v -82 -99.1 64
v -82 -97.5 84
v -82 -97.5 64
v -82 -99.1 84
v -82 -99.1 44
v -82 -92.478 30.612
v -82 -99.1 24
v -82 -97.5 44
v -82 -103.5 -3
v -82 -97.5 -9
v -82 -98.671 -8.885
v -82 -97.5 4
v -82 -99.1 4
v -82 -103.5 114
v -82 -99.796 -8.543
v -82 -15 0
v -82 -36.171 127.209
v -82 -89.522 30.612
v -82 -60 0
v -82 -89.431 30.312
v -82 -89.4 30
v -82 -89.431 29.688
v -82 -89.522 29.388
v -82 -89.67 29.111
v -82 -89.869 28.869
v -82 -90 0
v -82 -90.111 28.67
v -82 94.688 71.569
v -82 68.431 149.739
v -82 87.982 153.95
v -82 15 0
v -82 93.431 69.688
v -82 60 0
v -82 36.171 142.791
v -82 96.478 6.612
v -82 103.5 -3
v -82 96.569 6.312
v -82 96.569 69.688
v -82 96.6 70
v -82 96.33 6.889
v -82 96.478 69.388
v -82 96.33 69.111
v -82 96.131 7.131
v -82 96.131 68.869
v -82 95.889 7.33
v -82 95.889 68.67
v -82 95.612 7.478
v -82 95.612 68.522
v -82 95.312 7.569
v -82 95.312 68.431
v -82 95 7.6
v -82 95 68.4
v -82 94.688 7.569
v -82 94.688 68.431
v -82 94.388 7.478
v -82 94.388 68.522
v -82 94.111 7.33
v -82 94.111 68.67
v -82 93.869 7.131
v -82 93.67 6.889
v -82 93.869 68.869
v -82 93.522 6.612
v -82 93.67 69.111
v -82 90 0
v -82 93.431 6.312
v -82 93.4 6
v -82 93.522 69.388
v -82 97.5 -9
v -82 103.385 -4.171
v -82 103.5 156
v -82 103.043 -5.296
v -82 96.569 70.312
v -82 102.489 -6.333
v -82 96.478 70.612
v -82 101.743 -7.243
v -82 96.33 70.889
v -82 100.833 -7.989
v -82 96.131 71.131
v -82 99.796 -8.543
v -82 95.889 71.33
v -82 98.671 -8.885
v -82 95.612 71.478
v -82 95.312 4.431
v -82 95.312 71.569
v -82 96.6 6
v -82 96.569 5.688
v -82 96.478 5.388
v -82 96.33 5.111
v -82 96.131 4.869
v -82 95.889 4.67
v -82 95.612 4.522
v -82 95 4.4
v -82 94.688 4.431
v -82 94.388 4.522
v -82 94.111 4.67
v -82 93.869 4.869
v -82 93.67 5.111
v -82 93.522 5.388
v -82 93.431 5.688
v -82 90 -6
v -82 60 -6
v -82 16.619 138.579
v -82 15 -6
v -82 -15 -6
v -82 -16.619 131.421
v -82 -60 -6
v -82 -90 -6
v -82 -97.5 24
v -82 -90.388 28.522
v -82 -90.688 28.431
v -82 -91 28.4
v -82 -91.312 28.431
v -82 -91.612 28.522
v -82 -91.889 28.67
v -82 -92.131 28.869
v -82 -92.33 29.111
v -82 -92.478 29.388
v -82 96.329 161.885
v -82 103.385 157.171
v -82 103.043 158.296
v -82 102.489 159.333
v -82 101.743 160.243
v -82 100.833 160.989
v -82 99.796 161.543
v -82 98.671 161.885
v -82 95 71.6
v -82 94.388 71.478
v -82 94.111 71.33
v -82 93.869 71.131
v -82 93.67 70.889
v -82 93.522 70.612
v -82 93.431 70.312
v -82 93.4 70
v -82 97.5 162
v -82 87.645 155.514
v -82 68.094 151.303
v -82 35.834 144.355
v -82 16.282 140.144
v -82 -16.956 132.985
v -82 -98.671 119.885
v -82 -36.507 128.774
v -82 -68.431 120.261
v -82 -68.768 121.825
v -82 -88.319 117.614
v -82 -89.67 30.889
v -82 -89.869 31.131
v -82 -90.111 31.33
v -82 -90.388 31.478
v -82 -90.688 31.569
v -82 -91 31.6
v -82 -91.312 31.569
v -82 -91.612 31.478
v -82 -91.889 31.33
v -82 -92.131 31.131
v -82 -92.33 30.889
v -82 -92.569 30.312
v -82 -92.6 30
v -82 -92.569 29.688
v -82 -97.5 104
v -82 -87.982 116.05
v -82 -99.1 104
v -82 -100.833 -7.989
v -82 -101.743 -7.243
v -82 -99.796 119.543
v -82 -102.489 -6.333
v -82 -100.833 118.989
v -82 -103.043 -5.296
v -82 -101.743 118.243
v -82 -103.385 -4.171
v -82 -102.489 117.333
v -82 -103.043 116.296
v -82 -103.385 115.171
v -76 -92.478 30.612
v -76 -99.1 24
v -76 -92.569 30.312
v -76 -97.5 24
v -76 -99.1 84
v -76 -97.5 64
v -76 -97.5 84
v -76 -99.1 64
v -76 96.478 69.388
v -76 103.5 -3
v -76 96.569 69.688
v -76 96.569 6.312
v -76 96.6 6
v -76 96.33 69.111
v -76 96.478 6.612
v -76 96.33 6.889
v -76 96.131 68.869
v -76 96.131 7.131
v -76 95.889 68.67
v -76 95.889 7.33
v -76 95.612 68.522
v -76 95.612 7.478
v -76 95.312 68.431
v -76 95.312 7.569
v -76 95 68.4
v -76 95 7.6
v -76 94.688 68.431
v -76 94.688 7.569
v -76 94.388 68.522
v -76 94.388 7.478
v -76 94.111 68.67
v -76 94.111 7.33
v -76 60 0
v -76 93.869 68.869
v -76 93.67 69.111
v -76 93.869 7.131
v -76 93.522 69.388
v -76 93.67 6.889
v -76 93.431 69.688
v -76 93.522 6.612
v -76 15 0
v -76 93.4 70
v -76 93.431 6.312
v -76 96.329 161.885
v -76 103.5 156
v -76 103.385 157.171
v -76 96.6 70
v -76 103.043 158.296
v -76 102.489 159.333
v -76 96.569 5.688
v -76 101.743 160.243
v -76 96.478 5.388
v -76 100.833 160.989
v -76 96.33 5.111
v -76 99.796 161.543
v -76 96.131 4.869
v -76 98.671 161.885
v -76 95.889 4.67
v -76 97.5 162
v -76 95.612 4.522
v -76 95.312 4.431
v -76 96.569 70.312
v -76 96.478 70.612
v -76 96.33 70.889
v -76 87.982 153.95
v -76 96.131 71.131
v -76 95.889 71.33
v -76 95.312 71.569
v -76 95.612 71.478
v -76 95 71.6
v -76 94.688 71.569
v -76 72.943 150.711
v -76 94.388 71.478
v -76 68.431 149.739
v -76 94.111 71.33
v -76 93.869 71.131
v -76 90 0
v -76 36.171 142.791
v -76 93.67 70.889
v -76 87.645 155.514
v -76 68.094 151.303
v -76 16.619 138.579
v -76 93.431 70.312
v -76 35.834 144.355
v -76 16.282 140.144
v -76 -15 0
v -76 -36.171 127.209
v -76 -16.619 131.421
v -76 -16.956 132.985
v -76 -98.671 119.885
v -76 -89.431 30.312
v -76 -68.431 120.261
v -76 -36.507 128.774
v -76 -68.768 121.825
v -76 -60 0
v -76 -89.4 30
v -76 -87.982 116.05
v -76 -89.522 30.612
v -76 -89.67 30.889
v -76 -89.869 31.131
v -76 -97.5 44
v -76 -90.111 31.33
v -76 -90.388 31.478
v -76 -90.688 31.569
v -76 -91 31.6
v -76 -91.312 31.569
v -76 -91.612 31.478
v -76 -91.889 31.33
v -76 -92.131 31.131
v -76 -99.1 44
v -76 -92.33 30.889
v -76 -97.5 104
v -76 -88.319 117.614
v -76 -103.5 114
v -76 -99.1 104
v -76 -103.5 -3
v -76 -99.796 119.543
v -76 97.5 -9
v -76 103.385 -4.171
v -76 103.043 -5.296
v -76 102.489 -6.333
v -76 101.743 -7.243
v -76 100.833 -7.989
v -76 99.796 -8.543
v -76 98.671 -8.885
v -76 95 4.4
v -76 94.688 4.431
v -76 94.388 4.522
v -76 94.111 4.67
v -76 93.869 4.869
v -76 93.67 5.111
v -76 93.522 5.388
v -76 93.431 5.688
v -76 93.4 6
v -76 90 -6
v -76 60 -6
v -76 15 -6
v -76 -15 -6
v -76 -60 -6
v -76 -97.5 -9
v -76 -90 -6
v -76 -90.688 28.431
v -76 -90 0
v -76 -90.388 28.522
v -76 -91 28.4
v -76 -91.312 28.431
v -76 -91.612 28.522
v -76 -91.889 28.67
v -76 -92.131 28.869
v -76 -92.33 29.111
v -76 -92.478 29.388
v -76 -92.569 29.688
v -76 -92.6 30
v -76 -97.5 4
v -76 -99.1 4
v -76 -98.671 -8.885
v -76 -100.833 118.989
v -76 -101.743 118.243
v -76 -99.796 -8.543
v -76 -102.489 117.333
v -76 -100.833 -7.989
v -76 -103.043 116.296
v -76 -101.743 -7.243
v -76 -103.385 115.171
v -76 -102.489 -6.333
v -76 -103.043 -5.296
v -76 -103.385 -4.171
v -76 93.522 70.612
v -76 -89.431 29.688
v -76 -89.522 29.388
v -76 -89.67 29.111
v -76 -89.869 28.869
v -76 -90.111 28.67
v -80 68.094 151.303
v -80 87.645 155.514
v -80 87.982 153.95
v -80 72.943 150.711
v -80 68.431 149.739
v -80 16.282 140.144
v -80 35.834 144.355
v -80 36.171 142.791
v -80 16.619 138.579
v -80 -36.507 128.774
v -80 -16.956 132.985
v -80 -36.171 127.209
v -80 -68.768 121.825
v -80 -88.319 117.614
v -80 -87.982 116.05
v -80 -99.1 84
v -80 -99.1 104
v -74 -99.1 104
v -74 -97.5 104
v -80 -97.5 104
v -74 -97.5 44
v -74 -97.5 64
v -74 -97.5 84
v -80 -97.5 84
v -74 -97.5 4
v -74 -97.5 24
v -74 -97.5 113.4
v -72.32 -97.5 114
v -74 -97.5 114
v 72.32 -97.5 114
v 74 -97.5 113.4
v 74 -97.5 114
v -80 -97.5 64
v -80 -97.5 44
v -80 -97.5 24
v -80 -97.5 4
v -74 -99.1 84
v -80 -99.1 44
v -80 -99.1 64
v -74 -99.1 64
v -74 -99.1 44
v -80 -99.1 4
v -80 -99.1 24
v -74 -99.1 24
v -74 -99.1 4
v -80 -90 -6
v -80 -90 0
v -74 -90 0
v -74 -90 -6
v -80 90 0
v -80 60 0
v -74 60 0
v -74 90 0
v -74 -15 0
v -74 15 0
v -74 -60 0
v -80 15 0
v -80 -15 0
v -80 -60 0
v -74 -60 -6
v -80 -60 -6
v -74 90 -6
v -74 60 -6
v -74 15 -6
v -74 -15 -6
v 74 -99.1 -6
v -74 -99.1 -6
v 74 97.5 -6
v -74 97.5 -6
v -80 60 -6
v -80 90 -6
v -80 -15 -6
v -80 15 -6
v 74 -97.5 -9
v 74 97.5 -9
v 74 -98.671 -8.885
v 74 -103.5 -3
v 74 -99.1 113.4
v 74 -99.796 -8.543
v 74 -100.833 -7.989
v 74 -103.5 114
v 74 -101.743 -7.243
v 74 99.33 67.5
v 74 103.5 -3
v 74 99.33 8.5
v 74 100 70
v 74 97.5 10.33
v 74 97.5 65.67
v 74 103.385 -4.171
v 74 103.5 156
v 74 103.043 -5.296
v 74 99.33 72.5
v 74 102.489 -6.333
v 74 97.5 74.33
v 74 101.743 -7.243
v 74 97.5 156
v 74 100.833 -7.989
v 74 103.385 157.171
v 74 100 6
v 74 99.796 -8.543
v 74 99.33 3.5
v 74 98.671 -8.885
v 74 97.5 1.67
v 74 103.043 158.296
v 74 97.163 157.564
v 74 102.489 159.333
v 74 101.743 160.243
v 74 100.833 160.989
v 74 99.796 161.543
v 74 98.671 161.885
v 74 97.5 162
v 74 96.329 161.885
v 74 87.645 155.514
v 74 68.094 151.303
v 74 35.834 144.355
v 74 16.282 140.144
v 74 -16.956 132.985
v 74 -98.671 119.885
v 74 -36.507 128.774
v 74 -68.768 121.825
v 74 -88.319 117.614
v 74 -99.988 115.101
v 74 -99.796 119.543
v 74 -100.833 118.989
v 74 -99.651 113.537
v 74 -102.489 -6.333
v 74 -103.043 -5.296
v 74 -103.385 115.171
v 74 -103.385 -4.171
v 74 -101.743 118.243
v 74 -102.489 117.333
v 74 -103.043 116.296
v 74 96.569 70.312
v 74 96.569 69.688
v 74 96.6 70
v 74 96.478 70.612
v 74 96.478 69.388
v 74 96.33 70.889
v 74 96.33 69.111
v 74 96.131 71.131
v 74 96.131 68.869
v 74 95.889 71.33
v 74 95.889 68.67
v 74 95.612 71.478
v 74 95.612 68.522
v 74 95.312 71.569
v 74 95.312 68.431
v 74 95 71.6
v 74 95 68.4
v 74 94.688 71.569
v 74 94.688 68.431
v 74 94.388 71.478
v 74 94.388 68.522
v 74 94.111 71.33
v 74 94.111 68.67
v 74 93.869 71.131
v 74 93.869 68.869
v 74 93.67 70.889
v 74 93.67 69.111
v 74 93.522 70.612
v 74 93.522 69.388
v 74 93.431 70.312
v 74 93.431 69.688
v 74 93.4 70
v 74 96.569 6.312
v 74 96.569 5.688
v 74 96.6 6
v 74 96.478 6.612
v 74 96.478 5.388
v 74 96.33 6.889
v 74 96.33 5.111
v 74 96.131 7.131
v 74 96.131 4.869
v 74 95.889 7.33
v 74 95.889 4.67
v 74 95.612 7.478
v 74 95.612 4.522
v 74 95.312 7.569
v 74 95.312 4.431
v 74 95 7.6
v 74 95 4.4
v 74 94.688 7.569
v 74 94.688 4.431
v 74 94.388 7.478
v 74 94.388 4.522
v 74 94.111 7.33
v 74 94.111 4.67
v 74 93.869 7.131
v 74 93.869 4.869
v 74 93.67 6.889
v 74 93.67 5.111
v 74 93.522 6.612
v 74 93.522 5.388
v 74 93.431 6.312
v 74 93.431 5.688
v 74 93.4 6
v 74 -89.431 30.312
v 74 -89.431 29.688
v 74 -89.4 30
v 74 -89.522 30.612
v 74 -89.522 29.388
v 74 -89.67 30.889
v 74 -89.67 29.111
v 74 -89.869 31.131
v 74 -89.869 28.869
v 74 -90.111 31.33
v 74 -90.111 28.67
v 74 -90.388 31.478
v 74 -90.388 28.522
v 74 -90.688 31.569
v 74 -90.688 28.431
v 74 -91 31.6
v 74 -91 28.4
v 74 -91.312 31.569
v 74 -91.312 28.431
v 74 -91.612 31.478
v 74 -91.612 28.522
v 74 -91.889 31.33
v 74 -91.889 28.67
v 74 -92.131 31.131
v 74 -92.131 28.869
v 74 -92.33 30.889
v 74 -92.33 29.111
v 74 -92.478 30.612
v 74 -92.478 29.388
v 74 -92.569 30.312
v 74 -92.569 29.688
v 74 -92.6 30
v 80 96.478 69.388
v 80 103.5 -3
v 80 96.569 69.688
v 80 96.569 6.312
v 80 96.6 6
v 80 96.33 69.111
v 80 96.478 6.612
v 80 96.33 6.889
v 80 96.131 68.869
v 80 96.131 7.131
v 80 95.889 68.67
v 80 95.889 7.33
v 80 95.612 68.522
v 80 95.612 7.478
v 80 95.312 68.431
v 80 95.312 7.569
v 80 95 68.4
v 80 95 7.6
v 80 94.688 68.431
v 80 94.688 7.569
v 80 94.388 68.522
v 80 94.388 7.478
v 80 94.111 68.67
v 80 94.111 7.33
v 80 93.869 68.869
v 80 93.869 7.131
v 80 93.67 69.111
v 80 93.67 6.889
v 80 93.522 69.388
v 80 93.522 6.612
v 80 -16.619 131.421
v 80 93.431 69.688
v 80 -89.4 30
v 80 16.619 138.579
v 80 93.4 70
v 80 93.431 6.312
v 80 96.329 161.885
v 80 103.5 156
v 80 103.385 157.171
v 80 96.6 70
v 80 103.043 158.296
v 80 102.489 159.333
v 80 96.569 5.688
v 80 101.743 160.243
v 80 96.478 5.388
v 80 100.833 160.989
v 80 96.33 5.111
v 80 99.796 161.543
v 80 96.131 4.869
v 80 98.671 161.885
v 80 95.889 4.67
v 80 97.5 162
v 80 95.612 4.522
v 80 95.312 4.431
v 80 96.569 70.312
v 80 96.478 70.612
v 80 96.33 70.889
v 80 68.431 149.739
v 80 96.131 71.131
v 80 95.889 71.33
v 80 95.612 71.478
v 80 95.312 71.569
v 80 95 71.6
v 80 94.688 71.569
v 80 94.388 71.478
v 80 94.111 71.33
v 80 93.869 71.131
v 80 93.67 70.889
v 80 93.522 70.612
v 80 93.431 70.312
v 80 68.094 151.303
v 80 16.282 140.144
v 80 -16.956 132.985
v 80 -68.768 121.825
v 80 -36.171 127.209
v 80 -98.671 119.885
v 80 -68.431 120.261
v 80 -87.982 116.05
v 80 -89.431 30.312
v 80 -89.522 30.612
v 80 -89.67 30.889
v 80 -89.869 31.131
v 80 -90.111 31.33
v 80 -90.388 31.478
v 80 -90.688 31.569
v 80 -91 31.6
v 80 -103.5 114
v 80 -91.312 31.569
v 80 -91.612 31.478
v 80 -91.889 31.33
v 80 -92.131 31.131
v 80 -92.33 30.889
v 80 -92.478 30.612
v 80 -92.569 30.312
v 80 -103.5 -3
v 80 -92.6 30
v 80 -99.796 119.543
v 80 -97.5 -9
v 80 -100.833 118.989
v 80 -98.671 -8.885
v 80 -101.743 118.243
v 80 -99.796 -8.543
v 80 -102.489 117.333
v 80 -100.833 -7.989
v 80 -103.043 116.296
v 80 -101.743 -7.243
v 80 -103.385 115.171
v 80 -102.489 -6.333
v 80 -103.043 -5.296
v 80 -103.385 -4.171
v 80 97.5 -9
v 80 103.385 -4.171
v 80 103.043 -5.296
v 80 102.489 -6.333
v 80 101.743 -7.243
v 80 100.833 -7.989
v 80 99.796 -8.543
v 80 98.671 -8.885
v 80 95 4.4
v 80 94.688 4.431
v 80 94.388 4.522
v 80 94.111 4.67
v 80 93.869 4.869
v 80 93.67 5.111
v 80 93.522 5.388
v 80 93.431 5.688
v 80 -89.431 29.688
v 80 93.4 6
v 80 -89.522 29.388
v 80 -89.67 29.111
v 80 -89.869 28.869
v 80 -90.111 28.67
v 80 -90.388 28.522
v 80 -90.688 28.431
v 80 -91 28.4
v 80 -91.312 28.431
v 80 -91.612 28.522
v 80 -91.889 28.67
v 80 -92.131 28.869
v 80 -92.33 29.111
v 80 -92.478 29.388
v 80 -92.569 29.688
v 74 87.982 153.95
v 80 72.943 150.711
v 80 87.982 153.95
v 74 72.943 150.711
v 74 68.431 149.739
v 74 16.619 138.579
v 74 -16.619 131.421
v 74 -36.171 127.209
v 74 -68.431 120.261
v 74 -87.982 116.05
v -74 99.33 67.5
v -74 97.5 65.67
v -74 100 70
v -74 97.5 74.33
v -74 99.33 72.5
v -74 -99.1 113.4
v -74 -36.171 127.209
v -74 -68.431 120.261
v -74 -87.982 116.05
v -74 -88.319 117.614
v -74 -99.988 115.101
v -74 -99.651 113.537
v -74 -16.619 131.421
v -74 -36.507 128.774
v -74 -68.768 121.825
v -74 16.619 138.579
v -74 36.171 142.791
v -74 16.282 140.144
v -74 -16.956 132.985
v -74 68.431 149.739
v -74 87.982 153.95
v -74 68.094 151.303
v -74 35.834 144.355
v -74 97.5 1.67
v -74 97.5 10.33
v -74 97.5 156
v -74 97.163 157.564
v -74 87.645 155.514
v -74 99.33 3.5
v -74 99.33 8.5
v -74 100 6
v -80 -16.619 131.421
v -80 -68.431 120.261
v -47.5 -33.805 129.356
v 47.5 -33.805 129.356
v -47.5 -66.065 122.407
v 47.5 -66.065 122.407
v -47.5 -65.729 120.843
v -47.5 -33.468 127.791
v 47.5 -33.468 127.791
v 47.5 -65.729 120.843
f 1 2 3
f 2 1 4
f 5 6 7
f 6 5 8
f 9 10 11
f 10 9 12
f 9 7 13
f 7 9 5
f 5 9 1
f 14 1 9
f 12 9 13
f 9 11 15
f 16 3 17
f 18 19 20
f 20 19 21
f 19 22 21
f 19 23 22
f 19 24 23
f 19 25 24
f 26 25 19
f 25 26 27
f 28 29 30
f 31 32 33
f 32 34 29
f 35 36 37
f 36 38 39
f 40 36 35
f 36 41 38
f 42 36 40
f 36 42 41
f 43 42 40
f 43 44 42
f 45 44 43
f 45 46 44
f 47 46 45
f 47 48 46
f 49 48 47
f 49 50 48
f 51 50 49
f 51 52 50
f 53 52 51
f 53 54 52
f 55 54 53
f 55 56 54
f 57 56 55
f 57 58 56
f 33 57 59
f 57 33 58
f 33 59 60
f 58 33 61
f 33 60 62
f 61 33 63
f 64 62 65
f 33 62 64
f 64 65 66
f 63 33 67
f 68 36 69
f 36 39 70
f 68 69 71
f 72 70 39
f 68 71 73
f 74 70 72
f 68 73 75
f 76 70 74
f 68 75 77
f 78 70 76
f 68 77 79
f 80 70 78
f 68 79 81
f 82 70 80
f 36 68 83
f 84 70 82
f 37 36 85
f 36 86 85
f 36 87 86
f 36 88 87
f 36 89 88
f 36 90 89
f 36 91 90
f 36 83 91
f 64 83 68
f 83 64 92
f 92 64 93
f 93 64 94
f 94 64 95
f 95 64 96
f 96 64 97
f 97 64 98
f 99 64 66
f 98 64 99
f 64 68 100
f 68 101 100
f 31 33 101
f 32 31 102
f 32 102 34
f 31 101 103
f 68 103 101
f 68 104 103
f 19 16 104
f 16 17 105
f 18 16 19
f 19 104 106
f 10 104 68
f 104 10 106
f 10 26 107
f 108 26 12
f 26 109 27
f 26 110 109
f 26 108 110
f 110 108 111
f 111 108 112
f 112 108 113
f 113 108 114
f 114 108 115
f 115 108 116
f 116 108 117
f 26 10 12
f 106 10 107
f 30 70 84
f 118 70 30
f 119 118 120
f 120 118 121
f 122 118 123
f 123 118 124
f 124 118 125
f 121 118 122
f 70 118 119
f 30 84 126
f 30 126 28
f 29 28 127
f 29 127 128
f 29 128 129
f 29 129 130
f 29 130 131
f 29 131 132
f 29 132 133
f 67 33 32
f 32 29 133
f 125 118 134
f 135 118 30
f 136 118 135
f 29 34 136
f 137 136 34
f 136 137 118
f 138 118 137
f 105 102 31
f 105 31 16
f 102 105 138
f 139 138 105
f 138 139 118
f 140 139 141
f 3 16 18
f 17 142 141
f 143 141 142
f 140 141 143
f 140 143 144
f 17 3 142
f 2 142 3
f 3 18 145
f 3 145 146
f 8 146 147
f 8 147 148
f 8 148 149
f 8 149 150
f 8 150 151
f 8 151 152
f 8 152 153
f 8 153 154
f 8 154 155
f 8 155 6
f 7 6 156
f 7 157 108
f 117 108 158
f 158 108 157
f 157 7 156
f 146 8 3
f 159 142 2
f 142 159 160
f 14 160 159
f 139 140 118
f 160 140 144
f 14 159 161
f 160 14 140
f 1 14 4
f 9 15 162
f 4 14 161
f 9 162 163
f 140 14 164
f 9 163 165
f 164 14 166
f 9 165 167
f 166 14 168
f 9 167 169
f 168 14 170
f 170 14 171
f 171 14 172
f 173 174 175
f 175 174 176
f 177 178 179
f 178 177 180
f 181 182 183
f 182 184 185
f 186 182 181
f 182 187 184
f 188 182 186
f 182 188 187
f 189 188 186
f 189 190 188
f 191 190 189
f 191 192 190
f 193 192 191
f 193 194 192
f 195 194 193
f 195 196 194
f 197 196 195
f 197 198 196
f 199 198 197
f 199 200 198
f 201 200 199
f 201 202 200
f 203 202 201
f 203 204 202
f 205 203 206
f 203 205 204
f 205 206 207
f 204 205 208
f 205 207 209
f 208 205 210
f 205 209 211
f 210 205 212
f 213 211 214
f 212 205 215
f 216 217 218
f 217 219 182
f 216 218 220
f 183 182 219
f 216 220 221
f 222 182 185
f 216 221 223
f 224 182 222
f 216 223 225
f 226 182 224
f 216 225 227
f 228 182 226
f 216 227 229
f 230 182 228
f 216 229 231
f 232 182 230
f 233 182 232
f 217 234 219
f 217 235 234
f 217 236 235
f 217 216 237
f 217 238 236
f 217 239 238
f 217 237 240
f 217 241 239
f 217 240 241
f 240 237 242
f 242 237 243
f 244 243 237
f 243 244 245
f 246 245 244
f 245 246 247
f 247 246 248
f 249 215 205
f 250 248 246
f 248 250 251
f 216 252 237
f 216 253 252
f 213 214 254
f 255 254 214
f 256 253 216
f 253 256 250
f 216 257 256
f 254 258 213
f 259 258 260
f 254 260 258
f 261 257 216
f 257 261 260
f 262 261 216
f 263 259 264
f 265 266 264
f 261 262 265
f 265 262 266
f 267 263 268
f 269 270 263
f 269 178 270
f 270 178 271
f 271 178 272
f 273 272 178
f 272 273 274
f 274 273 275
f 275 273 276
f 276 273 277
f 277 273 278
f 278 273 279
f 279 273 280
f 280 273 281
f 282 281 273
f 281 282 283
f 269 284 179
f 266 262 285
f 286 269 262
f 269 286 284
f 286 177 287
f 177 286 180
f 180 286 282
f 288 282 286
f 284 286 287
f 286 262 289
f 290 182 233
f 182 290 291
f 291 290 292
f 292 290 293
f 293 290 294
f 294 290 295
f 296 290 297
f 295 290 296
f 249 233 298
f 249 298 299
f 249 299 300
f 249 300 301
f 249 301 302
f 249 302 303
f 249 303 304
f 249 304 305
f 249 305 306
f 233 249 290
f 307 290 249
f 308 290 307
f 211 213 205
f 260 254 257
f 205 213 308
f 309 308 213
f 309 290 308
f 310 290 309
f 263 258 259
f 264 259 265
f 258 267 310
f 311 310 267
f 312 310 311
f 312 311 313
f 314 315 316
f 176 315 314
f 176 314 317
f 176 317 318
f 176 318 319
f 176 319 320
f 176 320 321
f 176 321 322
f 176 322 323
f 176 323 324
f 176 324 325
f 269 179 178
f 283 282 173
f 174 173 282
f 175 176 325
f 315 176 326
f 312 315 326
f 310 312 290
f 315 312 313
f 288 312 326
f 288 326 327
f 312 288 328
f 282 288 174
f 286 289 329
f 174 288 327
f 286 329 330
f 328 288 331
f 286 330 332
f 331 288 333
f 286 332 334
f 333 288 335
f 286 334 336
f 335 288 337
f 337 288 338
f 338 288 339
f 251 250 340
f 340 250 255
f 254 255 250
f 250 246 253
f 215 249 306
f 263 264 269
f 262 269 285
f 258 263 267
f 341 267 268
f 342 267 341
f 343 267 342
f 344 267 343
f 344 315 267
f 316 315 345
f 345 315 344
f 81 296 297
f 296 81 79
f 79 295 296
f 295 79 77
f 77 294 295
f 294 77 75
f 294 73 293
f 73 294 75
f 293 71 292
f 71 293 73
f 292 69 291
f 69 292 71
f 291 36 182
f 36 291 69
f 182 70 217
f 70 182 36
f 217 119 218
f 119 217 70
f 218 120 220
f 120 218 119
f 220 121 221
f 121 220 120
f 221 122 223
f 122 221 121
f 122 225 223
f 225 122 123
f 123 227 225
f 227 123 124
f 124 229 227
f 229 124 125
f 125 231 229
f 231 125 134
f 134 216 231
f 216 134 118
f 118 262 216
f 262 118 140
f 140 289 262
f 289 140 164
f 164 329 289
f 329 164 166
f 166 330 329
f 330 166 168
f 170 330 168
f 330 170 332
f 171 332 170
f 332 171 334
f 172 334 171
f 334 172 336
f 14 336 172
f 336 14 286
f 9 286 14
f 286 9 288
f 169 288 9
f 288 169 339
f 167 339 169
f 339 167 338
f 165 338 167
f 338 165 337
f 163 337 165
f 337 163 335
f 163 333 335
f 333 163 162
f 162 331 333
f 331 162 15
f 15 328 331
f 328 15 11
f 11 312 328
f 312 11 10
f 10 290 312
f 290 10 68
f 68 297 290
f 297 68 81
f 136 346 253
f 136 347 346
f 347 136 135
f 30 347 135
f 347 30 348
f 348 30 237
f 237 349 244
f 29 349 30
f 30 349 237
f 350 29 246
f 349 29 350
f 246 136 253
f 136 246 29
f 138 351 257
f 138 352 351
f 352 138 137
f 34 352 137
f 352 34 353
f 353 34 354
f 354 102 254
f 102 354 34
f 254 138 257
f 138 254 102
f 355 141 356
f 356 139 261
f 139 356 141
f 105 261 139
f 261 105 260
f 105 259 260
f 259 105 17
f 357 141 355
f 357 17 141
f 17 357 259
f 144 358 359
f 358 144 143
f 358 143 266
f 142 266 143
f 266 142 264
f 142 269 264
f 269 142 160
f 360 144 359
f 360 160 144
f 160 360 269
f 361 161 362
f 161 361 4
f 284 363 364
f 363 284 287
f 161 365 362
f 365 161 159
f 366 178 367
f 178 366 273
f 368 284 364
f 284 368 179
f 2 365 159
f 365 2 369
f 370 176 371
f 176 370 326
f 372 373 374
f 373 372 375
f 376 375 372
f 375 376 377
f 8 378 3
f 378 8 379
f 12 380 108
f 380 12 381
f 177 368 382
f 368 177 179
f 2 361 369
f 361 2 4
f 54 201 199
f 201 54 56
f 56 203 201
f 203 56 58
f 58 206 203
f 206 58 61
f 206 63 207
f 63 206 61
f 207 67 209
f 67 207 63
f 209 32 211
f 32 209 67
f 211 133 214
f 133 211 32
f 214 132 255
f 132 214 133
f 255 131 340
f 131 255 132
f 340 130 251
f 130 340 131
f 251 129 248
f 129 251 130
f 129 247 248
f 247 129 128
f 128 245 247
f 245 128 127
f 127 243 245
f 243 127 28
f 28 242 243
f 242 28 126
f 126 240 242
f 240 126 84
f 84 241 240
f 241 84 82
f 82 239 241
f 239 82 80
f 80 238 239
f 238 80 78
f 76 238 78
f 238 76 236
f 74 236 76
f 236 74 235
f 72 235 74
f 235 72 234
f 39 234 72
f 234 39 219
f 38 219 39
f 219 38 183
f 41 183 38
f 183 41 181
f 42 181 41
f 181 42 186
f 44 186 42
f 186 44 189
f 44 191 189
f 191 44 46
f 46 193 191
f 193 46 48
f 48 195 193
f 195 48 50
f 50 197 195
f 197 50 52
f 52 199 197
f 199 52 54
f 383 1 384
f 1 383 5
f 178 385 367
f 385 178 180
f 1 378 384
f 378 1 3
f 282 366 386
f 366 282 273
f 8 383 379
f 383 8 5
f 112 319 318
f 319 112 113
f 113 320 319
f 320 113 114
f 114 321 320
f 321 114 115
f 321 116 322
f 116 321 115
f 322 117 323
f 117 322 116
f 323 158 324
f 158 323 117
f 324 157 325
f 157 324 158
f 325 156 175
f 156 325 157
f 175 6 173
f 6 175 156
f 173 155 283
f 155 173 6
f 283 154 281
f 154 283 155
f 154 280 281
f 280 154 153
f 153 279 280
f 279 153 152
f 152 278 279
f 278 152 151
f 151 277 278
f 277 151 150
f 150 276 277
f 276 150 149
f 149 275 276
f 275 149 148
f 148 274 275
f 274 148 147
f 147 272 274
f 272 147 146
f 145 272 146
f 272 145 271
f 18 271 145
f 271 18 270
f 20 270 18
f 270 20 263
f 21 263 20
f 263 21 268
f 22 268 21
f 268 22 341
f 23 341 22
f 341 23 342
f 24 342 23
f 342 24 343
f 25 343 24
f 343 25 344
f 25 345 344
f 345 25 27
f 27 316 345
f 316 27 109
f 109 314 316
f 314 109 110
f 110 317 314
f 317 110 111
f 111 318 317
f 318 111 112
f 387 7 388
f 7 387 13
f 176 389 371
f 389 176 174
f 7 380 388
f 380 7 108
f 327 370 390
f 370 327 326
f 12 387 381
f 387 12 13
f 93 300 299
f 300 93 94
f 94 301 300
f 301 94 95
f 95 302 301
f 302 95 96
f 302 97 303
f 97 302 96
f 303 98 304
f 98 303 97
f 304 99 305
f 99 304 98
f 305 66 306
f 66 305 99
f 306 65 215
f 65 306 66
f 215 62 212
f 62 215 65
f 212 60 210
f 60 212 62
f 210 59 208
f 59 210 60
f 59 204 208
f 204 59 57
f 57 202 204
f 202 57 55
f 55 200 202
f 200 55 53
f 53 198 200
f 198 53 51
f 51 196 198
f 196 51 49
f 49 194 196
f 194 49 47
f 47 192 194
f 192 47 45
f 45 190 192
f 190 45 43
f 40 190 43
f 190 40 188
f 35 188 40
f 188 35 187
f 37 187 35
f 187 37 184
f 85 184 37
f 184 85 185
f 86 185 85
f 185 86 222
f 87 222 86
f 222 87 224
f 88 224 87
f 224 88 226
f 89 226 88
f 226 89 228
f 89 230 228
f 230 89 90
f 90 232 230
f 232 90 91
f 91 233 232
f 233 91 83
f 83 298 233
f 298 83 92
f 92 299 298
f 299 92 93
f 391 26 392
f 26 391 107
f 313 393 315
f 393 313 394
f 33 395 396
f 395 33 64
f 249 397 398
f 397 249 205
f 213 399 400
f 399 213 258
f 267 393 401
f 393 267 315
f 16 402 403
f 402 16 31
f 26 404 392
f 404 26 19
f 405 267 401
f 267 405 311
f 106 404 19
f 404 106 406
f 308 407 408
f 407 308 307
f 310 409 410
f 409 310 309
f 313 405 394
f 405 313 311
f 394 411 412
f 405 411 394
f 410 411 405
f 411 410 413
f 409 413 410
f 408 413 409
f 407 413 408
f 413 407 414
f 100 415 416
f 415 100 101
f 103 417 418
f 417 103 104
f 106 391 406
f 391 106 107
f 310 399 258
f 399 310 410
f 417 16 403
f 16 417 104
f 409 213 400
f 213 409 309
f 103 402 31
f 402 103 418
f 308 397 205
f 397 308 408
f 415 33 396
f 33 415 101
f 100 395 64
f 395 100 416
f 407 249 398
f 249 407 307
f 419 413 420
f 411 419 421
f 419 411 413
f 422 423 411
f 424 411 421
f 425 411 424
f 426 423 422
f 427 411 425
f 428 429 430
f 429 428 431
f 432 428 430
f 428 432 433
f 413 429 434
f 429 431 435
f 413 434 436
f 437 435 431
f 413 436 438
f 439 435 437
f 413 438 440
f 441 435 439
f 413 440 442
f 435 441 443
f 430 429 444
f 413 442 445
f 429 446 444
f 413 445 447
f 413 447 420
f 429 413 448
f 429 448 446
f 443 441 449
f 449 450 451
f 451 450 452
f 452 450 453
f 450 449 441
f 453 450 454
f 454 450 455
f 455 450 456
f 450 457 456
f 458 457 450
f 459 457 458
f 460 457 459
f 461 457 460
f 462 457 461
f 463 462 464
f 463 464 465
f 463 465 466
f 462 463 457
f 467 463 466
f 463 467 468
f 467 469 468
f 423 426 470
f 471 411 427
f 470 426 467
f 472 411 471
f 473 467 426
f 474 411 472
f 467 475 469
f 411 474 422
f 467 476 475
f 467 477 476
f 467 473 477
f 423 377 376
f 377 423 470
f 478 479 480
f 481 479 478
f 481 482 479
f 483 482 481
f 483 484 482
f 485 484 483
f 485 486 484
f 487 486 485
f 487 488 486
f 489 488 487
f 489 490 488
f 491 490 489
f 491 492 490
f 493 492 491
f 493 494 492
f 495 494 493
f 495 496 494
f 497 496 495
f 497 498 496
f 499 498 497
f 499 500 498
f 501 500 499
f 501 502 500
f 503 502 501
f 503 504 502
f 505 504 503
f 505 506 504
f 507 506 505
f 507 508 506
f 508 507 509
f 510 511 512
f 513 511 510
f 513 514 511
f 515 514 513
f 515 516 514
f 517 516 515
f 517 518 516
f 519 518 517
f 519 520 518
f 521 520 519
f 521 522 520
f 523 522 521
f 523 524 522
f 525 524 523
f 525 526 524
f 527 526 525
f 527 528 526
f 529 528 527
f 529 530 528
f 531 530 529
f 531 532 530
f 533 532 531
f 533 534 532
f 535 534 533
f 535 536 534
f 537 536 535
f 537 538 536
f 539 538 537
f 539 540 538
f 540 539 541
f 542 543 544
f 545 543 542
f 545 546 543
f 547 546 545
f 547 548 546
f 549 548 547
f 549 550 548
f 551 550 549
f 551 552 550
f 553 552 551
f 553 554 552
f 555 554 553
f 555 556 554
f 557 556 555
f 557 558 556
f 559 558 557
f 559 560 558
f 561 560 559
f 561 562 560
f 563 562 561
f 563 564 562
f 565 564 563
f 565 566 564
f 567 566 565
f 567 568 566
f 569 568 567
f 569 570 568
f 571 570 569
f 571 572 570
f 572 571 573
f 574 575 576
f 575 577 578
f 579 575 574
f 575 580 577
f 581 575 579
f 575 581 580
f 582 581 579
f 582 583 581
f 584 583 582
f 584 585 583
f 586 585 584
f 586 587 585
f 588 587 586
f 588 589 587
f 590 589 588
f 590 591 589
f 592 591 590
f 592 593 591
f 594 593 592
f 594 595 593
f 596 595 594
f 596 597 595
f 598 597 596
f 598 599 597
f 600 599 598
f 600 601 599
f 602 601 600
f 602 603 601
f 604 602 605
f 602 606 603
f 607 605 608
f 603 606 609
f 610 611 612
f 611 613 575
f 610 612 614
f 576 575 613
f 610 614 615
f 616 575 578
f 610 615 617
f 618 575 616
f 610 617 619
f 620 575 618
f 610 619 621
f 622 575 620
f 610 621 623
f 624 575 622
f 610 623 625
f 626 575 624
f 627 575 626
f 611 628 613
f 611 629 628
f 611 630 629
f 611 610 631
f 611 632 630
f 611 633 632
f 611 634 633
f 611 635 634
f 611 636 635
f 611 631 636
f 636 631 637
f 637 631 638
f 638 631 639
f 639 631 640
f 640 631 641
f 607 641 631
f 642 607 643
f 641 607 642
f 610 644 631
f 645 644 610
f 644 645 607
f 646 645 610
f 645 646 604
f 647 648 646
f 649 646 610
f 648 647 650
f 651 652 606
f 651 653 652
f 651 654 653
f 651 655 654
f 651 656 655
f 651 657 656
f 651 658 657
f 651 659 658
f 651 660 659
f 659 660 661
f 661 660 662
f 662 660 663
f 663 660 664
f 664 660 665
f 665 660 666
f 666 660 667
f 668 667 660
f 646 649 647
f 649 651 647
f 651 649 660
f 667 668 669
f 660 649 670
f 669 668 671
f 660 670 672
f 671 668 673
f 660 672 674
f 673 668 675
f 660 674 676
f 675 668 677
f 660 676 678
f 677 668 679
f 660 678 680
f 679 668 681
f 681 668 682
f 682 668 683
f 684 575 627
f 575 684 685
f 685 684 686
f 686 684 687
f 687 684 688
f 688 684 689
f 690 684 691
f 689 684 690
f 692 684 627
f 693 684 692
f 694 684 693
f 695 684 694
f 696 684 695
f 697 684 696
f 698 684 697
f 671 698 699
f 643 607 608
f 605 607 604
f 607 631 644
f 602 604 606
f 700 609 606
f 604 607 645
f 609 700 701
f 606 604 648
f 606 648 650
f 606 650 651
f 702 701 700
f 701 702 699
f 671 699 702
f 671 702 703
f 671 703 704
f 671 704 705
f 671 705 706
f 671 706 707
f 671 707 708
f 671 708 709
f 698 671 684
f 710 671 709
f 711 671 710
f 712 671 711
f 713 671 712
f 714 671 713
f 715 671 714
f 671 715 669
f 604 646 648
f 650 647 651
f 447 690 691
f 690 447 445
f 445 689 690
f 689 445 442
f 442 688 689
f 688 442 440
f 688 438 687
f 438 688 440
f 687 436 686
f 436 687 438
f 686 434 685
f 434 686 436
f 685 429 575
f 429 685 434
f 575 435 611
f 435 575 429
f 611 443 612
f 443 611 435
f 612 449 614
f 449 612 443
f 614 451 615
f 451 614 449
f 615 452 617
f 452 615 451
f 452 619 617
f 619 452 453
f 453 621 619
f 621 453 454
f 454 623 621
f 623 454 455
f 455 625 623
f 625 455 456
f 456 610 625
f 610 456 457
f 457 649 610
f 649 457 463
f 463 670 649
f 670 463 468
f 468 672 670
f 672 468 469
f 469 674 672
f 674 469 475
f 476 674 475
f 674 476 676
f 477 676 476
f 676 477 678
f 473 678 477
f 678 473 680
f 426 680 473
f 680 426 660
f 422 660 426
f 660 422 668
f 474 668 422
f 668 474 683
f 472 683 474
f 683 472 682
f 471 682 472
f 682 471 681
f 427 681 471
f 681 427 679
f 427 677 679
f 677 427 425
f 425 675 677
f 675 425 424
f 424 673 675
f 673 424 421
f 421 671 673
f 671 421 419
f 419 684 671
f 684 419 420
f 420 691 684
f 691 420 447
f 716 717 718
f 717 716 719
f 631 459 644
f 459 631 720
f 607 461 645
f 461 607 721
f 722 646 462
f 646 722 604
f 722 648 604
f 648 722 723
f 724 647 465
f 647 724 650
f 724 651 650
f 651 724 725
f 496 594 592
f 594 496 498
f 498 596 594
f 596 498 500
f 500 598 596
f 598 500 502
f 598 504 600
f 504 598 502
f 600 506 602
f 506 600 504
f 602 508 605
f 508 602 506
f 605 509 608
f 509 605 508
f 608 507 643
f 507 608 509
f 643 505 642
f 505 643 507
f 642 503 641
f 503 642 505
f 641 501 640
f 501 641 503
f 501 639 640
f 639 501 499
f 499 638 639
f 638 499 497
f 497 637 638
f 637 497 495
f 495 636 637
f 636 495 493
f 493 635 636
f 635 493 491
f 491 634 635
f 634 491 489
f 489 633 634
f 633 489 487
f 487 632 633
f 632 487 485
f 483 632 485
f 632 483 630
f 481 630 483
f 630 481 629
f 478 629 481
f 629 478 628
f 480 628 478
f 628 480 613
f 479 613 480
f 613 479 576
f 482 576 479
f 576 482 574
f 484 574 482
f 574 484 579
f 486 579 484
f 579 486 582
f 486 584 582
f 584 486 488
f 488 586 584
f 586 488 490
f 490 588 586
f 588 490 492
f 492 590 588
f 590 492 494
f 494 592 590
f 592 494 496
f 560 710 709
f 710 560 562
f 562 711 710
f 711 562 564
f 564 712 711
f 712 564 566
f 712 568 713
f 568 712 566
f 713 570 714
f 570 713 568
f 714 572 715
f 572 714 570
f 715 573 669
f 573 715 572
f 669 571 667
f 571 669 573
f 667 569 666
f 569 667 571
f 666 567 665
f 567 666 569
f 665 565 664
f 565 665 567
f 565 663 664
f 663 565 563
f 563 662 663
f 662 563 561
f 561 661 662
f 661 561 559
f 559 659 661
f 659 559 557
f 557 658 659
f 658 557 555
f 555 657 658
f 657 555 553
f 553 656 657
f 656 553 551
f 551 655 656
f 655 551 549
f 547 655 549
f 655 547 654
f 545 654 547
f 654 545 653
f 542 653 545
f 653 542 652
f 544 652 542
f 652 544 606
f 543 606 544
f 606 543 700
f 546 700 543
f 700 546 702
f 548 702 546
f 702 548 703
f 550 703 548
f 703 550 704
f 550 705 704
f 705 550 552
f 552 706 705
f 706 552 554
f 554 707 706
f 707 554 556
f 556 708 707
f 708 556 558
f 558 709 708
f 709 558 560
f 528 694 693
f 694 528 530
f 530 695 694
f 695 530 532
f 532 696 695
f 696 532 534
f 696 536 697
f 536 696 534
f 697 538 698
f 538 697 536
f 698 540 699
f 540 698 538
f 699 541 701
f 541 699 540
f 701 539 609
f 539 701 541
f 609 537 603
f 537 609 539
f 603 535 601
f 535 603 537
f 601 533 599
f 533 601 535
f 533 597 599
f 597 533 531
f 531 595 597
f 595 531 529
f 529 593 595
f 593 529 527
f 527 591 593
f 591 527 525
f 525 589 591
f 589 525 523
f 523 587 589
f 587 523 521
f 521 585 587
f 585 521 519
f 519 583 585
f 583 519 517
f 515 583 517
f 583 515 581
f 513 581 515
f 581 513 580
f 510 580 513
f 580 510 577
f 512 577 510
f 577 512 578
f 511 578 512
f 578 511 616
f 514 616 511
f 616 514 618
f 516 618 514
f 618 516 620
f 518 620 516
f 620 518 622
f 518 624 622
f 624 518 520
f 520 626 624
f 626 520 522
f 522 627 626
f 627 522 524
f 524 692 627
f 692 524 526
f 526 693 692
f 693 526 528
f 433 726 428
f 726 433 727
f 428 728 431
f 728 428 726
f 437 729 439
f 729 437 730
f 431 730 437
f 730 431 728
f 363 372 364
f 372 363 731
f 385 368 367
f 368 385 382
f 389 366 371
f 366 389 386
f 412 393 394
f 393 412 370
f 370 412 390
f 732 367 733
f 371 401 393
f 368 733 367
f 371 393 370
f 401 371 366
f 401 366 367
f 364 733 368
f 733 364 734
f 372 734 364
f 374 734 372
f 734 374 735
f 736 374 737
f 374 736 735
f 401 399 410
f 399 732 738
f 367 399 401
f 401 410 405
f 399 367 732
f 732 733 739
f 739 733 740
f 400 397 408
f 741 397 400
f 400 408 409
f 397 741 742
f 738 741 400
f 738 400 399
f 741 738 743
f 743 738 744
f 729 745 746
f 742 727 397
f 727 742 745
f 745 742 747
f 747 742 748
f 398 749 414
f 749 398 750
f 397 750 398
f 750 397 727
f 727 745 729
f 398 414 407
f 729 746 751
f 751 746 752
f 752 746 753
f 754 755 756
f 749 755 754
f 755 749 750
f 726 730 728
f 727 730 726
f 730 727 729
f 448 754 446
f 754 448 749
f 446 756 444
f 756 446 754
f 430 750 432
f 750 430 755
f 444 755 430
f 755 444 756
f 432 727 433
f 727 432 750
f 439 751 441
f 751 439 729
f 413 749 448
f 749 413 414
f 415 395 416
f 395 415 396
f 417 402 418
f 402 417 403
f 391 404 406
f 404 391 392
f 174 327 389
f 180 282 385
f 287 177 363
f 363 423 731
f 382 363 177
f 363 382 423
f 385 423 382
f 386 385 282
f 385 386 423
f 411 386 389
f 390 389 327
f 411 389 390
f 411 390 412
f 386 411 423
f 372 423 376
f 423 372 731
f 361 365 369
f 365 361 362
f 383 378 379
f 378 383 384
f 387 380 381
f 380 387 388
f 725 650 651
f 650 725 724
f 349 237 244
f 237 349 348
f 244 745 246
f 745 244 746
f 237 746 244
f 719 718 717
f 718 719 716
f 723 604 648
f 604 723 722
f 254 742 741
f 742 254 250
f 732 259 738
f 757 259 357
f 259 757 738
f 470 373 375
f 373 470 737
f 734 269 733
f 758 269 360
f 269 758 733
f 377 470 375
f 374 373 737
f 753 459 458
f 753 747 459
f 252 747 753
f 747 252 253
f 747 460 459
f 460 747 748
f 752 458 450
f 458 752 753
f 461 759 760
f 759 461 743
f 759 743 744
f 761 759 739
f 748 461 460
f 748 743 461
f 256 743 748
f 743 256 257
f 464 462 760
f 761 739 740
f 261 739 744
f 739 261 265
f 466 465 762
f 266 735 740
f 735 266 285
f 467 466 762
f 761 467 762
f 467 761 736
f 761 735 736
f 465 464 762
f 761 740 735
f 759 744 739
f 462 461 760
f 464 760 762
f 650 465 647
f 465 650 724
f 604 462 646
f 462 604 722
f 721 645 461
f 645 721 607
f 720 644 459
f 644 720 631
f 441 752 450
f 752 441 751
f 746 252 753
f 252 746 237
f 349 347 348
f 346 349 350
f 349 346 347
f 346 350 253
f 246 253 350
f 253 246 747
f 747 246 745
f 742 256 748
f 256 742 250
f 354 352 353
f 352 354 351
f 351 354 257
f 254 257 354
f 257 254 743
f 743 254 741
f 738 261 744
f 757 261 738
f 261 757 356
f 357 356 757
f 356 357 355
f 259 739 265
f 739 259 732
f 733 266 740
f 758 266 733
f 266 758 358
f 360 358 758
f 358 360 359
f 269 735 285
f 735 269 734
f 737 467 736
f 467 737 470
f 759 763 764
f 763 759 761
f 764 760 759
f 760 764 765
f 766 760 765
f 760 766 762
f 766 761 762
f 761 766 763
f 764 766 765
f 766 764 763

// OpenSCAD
// file: top_panel.scad
include <./dimensions.scad>;

module TopPanel() {
  difference() {
    union() {
      // Main
      offset_y = 2.2;
      translate([0, -offset_y / 2]) {
        square([internal_width, top_panel_height() + offset_y], center=true);
      }

      // Tabs
      for(y = top_panel_tab_positions) {
        translate([0, y]) {
          square([internal_width + (side_panel_thickness * 2), top_panel_tab_width], center=true);
        }
      }
    }

    // Printer output slot cutout
    translate([0, (-top_panel_height() / 2) + 49]) {
      square([95, 33], center=true);
    }
  }
}

module TopPanel3D() {
  linear_extrude(height = top_panel_thickness) {
    TopPanel();
  }
}

TopPanel();
// file: spacer.scad
include <dimensions.scad>;

module Spacer3D() {
  rotate([0, 90, 0]) {
    difference() {
      // Main body
      cylinder(h = internal_width, d = 10, center = true, $fn = 12);

      // Brass insert holes
      for(a = [0, 180]) {
        rotate([0, a, 0]) {
          translate([0, 0, -(internal_width / 2) - 0.01]) {
            cylinder(h = 40, d = 4.5, $fn = 8);
          }
        }
      }
    }
  }
}

Spacer3D();
// file: side_panel.scad
include <./dimensions.scad>;

module SidePanel() {
  difference() {
    // Main
    hull() {
      for(p = [
        [-internal_depth / 2, -bottom_panel_thickness / 2],
        [-internal_depth / 2, internal_front_height],
        [internal_depth / 2, internal_rear_height],
        [internal_depth / 2, -bottom_panel_thickness / 2],
      ]) {
        translate(p) {
          circle(r = 6, $fn = 32);
        }
      }
    }

    // Spacer mounting holes
    for(p = spacer_positions) {
      translate([p[0], p[1]]) {
        circle(d = 3.2, $fn = 32);
      }
    }

    // Bottom panel tab slots
    for(x = bottom_panel_tab_positions) {
      translate([x, -bottom_panel_thickness / 2]) {
        square([bottom_panel_tab_width, side_panel_thickness], center=true);
      }
    }

    // Front panel tab slots
    for(y = front_panel_tab_positions) {
      translate([(-internal_depth - front_panel_thickness) / 2, ((internal_front_height - bottom_panel_thickness) / 2) + y]) {
        square([front_panel_thickness, front_panel_tab_width], center=true);
      }
    }

    // Top panel tab slots
    translate([0, top_panel_assembly_height()]) {
      rotate([0, 0, top_panel_angle()]) {
        for(x = top_panel_tab_positions) {
          translate([x, top_panel_thickness / 2]) {
            square([top_panel_tab_width, top_panel_thickness], center=true);
          }
        }
      }
    }
  }
}

module SidePanel3D() {
  rotate([90, 0, 90]) {
    translate([0, 0, -side_panel_thickness / 2]) {
      linear_extrude(height = side_panel_thickness) {
        SidePanel();
      }
    }
  }
}

SidePanel();
// file: front_panel.scad
include <./dimensions.scad>;

module FrontPanel() {
  // Main
  offset_y = -0.6;
  translate([0, offset_y / 2]) {
    square([internal_width, internal_front_height + bottom_panel_thickness + offset_y], center=true);
  }

  // Tabs
  for(y = front_panel_tab_positions) {
    translate([0, y]) {
      square([internal_width + (side_panel_thickness * 2), front_panel_tab_width], center=true);
    }
  }
}

module FrontPanel3D() {
  rotate([90, 0, 0]) {
    linear_extrude(height = front_panel_thickness) {
      FrontPanel();
    }
  }
}

FrontPanel();
// file: bottom_panel.scad
include <./dimensions.scad>;

module BottomPanel() {
  // Main
  square([internal_width, internal_depth], center=true);

  // Tabs
  for(y = bottom_panel_tab_positions) {
    translate([0, y]) {
      square([internal_width + (bottom_panel_thickness * 2), bottom_panel_tab_width], center=true);
    }
  }
}

module BottomPanel3D() {
  translate([0, 0, -bottom_panel_thickness]) {
    linear_extrude(height = bottom_panel_thickness) {
      BottomPanel();
    }
  }
}

BottomPanel();
// file: dimensions.scad
internal_width = 148;
internal_depth = 195;
internal_front_height = 114;
internal_rear_height = 156;

spacer_positions = [
  [95, 70],
  [95, 6],
  [-91, 30],
];

side_panel_thickness = 6;

bottom_panel_thickness = 6;
bottom_panel_tab_width = 30;
bottom_panel_tab_positions = [-75, 0, 75];

top_panel_thickness = 1.6;
top_panel_tab_width = 20;
top_panel_tab_positions = [-80, -27, 27, 80];

front_panel_thickness = 1.6;
front_panel_tab_width = 20;
front_panel_tab_positions = [-40, 0, 40];

function top_panel_angle() = atan((internal_rear_height - internal_front_height) / internal_depth);
function top_panel_height() = sqrt(pow(internal_depth, 2) + pow(internal_rear_height - internal_front_height, 2));
function top_panel_assembly_height() = (internal_front_height + internal_rear_height) / 2;
// main file
include <./dimensions.scad>;
use <./bottom_panel.scad>;
use <./front_panel.scad>;
use <./side_panel.scad>;
use <./spacer.scad>;
use <./top_panel.scad>;

// Side panels
color("orange") {
  dx = (internal_width + side_panel_thickness) / 2;
  for(x = [-dx - 2, dx]) {
    translate([x, 0, 0]) {
      SidePanel3D();
    }
  }
}

// Spacers
color("red") {
  for(p = spacer_positions) {
    translate([0, p[0], p[1]]) {
      Spacer3D();
    }
  }
}

// Bottom panel
color("cyan") {
  BottomPanel3D();
}

// Front panel
color("green") {
  translate([0, -internal_depth / 2, (internal_front_height - bottom_panel_thickness) / 2]) {
    FrontPanel3D();
  }
}

// Top panel
color("blue") {
  translate([0, 0, top_panel_assembly_height()]) {
    rotate([top_panel_angle(), 0, 0]) {
      TopPanel3D();
    }
  }
}

// Internal volume
color("magenta", 0.4) {
  polyhedron(
    points = [
      [-internal_width / 2, -internal_depth / 2, 0],
      [ internal_width / 2, -internal_depth / 2, 0],
      [ internal_width / 2,  internal_depth / 2, 0],
      [-internal_width / 2,  internal_depth / 2, 0],
      [-internal_width / 2, -internal_depth / 2, internal_front_height],
      [ internal_width / 2, -internal_depth / 2, internal_front_height],
      [ internal_width / 2,  internal_depth / 2, internal_rear_height],
      [-internal_width / 2,  internal_depth / 2, internal_rear_height],
    ],
    faces = [
      [0, 1, 2, 3],
      [4, 5, 1, 0],
      [7, 6, 5, 4],
      [5, 6, 2, 1],
      [6, 7, 3, 2],
      [7, 4, 0, 3],
    ]
  );
}
